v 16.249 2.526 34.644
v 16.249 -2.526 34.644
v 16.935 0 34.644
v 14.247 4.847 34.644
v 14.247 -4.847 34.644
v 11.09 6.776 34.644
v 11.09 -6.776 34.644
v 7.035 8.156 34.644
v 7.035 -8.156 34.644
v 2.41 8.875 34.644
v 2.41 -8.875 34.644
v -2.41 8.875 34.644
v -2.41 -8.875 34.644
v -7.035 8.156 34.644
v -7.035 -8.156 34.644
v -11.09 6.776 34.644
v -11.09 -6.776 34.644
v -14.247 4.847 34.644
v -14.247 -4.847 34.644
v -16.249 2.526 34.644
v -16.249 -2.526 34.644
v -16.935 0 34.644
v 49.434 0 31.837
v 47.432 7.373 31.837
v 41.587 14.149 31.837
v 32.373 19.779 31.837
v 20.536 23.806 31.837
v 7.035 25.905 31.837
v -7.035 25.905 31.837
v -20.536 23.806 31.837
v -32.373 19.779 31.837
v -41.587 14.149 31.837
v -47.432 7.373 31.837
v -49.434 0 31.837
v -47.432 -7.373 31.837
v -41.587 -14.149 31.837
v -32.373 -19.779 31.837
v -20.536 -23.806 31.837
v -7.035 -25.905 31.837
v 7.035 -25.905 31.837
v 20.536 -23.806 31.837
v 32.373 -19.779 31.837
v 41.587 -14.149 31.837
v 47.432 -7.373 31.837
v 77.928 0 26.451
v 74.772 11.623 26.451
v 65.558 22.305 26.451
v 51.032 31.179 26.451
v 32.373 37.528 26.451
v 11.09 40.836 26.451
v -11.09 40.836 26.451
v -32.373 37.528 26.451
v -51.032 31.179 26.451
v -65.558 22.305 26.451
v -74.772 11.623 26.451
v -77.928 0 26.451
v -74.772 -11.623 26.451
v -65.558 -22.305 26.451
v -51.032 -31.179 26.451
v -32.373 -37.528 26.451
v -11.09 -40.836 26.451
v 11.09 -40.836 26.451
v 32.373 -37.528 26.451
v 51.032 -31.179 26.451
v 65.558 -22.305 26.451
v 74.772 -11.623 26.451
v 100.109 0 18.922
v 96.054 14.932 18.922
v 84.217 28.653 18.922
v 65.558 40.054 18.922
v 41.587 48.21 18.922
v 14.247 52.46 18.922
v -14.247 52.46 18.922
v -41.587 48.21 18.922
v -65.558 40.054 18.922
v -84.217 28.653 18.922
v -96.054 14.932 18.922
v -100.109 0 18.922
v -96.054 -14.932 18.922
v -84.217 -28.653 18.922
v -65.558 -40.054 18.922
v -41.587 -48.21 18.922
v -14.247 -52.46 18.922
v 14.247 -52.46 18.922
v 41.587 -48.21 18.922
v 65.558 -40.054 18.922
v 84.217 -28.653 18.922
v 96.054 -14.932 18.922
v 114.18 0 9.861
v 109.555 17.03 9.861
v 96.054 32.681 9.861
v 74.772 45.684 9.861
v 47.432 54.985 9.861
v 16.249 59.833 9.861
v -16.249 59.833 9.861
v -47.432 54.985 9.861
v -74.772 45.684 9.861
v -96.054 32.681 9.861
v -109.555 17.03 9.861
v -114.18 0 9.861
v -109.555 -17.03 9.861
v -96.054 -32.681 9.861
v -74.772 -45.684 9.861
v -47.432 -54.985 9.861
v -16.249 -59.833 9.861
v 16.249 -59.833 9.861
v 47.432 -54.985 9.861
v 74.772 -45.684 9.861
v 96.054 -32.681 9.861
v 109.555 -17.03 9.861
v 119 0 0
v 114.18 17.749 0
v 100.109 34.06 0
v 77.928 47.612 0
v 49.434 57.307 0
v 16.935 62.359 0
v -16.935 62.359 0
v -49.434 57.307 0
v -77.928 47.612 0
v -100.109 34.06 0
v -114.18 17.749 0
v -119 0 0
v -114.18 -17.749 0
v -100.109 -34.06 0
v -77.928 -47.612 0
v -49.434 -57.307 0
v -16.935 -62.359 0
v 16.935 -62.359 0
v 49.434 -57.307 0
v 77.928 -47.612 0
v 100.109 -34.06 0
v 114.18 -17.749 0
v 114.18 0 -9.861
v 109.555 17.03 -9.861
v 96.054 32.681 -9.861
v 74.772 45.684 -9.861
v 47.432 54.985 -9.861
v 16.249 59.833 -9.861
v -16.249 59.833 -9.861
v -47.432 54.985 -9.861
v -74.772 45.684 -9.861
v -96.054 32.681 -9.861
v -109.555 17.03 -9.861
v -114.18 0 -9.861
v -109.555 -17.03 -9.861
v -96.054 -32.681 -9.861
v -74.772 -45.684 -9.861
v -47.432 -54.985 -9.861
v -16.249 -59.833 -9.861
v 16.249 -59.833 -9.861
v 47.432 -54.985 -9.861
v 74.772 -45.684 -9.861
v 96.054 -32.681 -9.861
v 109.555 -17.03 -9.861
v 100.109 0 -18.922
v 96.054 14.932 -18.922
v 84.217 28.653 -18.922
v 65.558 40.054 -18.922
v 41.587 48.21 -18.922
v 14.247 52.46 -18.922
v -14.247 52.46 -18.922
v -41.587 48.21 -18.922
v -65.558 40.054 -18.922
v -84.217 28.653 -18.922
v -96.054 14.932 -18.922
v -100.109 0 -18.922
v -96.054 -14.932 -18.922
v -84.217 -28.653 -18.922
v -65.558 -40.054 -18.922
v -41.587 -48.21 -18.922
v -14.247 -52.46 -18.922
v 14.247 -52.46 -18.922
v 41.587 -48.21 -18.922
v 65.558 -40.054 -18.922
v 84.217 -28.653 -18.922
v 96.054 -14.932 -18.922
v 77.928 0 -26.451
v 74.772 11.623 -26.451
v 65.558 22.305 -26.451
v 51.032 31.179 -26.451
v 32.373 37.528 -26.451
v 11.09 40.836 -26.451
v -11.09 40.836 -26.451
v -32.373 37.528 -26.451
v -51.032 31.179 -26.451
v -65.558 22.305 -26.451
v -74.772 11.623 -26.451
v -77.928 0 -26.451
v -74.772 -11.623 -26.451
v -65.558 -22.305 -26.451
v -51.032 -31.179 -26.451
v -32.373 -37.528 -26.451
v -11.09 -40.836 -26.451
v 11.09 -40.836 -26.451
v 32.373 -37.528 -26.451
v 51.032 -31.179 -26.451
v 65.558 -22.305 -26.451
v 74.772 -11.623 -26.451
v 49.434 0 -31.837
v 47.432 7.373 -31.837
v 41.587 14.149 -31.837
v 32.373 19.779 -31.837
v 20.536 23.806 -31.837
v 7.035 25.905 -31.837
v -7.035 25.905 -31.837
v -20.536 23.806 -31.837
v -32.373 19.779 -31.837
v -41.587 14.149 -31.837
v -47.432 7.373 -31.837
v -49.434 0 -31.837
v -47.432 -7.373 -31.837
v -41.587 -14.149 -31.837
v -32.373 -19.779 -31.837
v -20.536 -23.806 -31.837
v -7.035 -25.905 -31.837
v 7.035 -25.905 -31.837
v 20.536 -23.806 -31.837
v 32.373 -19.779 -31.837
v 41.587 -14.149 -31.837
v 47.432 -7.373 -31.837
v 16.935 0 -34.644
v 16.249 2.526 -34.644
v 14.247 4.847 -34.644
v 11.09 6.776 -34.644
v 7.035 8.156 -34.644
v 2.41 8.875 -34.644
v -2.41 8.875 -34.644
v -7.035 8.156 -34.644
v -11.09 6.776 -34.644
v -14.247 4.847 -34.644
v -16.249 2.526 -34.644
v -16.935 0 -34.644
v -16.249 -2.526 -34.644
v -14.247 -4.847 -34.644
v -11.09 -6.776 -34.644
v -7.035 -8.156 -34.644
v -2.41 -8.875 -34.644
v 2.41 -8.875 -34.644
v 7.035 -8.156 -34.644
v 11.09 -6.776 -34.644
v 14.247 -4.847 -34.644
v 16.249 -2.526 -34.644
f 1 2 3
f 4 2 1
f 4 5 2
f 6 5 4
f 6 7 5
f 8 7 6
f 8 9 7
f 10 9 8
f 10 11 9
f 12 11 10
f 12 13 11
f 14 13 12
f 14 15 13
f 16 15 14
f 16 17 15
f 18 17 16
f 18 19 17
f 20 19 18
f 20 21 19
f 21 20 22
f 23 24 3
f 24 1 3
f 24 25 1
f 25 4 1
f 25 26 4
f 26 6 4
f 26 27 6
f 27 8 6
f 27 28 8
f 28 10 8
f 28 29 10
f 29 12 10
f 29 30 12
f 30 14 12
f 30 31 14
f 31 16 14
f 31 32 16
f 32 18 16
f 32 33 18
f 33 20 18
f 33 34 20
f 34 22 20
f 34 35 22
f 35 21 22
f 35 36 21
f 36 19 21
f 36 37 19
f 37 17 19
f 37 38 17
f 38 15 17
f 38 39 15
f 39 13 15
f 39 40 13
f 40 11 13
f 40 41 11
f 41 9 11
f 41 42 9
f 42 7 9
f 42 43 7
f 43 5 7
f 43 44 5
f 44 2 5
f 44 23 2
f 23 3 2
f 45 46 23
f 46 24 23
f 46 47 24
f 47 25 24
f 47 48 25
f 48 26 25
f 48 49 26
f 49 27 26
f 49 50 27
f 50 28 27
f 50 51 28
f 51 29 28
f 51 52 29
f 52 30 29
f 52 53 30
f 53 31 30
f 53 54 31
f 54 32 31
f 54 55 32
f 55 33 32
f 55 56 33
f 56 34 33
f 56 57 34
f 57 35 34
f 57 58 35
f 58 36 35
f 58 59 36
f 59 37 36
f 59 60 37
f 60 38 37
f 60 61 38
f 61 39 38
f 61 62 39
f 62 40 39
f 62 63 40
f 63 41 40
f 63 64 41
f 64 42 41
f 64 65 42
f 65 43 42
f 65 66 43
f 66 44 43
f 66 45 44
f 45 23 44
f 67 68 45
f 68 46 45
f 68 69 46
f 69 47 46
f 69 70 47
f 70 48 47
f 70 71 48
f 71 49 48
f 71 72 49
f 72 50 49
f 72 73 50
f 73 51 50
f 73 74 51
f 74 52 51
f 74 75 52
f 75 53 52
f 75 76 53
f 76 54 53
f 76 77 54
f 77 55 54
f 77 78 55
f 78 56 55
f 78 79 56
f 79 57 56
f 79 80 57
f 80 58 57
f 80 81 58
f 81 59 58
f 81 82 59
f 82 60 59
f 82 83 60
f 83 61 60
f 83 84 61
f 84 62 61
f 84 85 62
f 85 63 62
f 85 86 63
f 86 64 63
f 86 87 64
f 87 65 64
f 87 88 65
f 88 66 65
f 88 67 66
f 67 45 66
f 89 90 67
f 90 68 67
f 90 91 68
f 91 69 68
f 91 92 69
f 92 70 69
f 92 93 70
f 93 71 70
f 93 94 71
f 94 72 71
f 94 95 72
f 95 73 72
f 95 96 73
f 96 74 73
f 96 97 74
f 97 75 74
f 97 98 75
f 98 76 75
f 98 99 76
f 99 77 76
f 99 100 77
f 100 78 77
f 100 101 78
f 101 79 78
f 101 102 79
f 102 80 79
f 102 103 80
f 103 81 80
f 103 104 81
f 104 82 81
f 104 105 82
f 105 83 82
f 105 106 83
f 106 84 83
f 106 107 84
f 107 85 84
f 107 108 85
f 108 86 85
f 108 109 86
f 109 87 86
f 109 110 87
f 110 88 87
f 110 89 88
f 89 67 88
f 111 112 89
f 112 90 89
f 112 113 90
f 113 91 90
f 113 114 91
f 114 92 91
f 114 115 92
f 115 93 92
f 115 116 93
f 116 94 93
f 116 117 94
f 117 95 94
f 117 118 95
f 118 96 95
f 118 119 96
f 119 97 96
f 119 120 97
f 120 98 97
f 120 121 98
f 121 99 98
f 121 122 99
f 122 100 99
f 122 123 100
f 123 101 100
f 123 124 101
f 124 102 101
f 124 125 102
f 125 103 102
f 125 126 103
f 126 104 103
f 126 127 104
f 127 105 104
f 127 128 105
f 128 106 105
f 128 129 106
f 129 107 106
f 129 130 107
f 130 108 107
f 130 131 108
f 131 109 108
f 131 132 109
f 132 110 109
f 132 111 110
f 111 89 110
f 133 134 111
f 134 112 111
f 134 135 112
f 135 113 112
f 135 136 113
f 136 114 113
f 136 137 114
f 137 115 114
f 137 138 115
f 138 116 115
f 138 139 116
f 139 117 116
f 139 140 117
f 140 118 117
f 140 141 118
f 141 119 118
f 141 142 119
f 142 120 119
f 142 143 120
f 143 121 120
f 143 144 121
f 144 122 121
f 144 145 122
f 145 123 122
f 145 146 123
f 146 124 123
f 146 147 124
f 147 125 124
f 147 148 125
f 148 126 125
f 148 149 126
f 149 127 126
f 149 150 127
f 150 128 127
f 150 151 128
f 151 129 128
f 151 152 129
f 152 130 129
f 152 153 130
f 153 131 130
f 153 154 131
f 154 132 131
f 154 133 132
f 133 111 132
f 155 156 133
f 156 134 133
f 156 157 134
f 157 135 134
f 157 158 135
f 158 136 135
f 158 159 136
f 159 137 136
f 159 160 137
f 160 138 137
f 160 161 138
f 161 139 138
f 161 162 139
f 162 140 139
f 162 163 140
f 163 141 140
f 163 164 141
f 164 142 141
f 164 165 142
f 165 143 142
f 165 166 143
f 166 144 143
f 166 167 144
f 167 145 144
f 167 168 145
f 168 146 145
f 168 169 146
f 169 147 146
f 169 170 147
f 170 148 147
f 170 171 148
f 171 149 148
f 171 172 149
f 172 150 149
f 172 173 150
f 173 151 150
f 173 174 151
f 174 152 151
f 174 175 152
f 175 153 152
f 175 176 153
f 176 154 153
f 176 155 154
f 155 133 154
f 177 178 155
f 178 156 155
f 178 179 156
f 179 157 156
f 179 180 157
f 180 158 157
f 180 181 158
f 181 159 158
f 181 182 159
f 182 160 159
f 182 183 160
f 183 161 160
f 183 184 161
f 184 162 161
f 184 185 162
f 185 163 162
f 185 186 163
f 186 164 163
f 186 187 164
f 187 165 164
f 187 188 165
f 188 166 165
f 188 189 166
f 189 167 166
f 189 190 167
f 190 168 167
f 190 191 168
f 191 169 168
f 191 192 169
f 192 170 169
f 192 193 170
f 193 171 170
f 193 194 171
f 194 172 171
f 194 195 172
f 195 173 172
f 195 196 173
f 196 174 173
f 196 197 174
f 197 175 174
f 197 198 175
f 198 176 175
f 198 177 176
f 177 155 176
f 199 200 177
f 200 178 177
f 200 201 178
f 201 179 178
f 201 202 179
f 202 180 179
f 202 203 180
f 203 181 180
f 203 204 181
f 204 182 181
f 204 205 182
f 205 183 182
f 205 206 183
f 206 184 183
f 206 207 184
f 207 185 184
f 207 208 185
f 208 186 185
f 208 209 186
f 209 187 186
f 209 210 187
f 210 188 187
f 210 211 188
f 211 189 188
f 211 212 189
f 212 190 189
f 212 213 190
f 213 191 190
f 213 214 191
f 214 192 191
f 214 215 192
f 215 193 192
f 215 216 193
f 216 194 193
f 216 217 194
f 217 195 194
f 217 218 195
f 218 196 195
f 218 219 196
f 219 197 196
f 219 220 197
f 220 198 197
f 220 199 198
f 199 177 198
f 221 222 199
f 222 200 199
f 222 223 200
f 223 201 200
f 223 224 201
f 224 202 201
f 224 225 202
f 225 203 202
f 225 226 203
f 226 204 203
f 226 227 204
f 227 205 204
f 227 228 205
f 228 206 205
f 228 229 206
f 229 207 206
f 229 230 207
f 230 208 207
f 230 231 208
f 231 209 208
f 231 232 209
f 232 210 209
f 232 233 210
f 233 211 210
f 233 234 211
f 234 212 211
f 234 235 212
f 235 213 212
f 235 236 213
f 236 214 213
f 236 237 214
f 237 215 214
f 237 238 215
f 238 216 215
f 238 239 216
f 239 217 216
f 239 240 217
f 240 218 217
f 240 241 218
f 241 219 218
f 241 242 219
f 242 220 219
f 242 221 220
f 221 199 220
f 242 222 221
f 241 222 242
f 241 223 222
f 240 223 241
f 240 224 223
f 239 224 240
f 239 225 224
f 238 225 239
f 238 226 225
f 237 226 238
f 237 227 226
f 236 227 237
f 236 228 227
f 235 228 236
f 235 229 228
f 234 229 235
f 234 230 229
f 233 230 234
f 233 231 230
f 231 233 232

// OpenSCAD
// Generated by SolidPython 1.0.1 on 2020-07-29 00:46:53


scale(v = [17, 9, 5]) {
	sphere(r = 7);
}
/***********************************************
*********      SolidPython code:      **********
************************************************
 
# import packages: SolidPython
from solid import *
from solid.utils import *
from itertools import chain, combinations, permutations


class Resize:

    def __init__(self, scad_file):
        self.scad_file = scad_file
        #self.scad_file = import_scad(scad_file)
        # cone/cylinder param:
        self.r1 = 0
        self.r2 = 0
        self.h = 0
        # rectangular prism param:
        self.w = 0
        self.l = 0
        # ellipse param:
        self.r = 0

    # import OpenScad code (file name corresponds to shape)


    # classify shape + parameters
    def assign(self, param1, param2, param3):
        if self.scad_file == 'cone.scad':
            self.r1 = param1
            self.r2 = param2
            self.h = param3
        elif self.scad_file == 'cylinder.scad':
            self.r1 = param1
            self.r2 = param2
            self.h = param3
        elif self.scad_file == 'rectangularPrism.scad':
            self.h = param1
            self.l = param2
            self.w = param3
        else:
            self.r = param1
            self.h = param2

    # resize parameters
    def iterate(self):
        x = range(3, 20, 2)
        i = 1
        if self.scad_file == 'cone.scad':
            tempList = list(permutations(x, 2))
            for temp in tempList:
                param1 = temp[0]
                param2 = temp[1]
                filepath = 'produced_scad_files/' + 'cone' + str(param1) + '_' + str(param2) + '_' + '.scad'
                scad_render_to_file(cylinder(h=param1, r1=param2, r2=0), filepath)

        elif self.scad_file == 'cylinder.scad':
            tempList = list(permutations(x, 3))
            for temp in tempList:
                param1 = temp[0]
                param2 = temp[1]
                filepath = 'produced_scad_files/' + 'cylinder' + str(param1) + '_' + str(param2) + '_' + '.scad'
                scad_render_to_file(cylinder(h=param1, r1=param2, r2=param2), filepath)

        elif self.scad_file == 'rectangularPrism.scad':
            tempList = list(permutations(x, 3))
            for temp in tempList:
                param1 = temp[0]
                param2 = temp[1]
                param3 = temp[2]
                filepath = 'produced_scad_files/' + 'rectangularPrism' + str(param1) + '_' + str(param2) + '_' + str(
                    param3) + '.scad'
                scad_render_to_file(cube(size=(param1, param2, param3)), filepath)

        elif self.scad_file == 'ellipse.scad':
            tempList = list(permutations(x, 4))
            for temp in tempList:
                param1 = temp[0]
                param2 = temp[1]
                param3 = temp[2]
                param4 = temp[3]
                filepath = 'produced_scad_files/' + 'ellipse' + str(param1) + '_' + str(param2) + '_' + str(param3) + '_' + str(param4) + '.scad'
                scad_render_to_file(scale([param1, param2, param3])(sphere(r=param4)), filepath)

    def render_to_scadfile(self):
        scad_render_to_file(scad, 'example.scad') 
 
************************************************/
